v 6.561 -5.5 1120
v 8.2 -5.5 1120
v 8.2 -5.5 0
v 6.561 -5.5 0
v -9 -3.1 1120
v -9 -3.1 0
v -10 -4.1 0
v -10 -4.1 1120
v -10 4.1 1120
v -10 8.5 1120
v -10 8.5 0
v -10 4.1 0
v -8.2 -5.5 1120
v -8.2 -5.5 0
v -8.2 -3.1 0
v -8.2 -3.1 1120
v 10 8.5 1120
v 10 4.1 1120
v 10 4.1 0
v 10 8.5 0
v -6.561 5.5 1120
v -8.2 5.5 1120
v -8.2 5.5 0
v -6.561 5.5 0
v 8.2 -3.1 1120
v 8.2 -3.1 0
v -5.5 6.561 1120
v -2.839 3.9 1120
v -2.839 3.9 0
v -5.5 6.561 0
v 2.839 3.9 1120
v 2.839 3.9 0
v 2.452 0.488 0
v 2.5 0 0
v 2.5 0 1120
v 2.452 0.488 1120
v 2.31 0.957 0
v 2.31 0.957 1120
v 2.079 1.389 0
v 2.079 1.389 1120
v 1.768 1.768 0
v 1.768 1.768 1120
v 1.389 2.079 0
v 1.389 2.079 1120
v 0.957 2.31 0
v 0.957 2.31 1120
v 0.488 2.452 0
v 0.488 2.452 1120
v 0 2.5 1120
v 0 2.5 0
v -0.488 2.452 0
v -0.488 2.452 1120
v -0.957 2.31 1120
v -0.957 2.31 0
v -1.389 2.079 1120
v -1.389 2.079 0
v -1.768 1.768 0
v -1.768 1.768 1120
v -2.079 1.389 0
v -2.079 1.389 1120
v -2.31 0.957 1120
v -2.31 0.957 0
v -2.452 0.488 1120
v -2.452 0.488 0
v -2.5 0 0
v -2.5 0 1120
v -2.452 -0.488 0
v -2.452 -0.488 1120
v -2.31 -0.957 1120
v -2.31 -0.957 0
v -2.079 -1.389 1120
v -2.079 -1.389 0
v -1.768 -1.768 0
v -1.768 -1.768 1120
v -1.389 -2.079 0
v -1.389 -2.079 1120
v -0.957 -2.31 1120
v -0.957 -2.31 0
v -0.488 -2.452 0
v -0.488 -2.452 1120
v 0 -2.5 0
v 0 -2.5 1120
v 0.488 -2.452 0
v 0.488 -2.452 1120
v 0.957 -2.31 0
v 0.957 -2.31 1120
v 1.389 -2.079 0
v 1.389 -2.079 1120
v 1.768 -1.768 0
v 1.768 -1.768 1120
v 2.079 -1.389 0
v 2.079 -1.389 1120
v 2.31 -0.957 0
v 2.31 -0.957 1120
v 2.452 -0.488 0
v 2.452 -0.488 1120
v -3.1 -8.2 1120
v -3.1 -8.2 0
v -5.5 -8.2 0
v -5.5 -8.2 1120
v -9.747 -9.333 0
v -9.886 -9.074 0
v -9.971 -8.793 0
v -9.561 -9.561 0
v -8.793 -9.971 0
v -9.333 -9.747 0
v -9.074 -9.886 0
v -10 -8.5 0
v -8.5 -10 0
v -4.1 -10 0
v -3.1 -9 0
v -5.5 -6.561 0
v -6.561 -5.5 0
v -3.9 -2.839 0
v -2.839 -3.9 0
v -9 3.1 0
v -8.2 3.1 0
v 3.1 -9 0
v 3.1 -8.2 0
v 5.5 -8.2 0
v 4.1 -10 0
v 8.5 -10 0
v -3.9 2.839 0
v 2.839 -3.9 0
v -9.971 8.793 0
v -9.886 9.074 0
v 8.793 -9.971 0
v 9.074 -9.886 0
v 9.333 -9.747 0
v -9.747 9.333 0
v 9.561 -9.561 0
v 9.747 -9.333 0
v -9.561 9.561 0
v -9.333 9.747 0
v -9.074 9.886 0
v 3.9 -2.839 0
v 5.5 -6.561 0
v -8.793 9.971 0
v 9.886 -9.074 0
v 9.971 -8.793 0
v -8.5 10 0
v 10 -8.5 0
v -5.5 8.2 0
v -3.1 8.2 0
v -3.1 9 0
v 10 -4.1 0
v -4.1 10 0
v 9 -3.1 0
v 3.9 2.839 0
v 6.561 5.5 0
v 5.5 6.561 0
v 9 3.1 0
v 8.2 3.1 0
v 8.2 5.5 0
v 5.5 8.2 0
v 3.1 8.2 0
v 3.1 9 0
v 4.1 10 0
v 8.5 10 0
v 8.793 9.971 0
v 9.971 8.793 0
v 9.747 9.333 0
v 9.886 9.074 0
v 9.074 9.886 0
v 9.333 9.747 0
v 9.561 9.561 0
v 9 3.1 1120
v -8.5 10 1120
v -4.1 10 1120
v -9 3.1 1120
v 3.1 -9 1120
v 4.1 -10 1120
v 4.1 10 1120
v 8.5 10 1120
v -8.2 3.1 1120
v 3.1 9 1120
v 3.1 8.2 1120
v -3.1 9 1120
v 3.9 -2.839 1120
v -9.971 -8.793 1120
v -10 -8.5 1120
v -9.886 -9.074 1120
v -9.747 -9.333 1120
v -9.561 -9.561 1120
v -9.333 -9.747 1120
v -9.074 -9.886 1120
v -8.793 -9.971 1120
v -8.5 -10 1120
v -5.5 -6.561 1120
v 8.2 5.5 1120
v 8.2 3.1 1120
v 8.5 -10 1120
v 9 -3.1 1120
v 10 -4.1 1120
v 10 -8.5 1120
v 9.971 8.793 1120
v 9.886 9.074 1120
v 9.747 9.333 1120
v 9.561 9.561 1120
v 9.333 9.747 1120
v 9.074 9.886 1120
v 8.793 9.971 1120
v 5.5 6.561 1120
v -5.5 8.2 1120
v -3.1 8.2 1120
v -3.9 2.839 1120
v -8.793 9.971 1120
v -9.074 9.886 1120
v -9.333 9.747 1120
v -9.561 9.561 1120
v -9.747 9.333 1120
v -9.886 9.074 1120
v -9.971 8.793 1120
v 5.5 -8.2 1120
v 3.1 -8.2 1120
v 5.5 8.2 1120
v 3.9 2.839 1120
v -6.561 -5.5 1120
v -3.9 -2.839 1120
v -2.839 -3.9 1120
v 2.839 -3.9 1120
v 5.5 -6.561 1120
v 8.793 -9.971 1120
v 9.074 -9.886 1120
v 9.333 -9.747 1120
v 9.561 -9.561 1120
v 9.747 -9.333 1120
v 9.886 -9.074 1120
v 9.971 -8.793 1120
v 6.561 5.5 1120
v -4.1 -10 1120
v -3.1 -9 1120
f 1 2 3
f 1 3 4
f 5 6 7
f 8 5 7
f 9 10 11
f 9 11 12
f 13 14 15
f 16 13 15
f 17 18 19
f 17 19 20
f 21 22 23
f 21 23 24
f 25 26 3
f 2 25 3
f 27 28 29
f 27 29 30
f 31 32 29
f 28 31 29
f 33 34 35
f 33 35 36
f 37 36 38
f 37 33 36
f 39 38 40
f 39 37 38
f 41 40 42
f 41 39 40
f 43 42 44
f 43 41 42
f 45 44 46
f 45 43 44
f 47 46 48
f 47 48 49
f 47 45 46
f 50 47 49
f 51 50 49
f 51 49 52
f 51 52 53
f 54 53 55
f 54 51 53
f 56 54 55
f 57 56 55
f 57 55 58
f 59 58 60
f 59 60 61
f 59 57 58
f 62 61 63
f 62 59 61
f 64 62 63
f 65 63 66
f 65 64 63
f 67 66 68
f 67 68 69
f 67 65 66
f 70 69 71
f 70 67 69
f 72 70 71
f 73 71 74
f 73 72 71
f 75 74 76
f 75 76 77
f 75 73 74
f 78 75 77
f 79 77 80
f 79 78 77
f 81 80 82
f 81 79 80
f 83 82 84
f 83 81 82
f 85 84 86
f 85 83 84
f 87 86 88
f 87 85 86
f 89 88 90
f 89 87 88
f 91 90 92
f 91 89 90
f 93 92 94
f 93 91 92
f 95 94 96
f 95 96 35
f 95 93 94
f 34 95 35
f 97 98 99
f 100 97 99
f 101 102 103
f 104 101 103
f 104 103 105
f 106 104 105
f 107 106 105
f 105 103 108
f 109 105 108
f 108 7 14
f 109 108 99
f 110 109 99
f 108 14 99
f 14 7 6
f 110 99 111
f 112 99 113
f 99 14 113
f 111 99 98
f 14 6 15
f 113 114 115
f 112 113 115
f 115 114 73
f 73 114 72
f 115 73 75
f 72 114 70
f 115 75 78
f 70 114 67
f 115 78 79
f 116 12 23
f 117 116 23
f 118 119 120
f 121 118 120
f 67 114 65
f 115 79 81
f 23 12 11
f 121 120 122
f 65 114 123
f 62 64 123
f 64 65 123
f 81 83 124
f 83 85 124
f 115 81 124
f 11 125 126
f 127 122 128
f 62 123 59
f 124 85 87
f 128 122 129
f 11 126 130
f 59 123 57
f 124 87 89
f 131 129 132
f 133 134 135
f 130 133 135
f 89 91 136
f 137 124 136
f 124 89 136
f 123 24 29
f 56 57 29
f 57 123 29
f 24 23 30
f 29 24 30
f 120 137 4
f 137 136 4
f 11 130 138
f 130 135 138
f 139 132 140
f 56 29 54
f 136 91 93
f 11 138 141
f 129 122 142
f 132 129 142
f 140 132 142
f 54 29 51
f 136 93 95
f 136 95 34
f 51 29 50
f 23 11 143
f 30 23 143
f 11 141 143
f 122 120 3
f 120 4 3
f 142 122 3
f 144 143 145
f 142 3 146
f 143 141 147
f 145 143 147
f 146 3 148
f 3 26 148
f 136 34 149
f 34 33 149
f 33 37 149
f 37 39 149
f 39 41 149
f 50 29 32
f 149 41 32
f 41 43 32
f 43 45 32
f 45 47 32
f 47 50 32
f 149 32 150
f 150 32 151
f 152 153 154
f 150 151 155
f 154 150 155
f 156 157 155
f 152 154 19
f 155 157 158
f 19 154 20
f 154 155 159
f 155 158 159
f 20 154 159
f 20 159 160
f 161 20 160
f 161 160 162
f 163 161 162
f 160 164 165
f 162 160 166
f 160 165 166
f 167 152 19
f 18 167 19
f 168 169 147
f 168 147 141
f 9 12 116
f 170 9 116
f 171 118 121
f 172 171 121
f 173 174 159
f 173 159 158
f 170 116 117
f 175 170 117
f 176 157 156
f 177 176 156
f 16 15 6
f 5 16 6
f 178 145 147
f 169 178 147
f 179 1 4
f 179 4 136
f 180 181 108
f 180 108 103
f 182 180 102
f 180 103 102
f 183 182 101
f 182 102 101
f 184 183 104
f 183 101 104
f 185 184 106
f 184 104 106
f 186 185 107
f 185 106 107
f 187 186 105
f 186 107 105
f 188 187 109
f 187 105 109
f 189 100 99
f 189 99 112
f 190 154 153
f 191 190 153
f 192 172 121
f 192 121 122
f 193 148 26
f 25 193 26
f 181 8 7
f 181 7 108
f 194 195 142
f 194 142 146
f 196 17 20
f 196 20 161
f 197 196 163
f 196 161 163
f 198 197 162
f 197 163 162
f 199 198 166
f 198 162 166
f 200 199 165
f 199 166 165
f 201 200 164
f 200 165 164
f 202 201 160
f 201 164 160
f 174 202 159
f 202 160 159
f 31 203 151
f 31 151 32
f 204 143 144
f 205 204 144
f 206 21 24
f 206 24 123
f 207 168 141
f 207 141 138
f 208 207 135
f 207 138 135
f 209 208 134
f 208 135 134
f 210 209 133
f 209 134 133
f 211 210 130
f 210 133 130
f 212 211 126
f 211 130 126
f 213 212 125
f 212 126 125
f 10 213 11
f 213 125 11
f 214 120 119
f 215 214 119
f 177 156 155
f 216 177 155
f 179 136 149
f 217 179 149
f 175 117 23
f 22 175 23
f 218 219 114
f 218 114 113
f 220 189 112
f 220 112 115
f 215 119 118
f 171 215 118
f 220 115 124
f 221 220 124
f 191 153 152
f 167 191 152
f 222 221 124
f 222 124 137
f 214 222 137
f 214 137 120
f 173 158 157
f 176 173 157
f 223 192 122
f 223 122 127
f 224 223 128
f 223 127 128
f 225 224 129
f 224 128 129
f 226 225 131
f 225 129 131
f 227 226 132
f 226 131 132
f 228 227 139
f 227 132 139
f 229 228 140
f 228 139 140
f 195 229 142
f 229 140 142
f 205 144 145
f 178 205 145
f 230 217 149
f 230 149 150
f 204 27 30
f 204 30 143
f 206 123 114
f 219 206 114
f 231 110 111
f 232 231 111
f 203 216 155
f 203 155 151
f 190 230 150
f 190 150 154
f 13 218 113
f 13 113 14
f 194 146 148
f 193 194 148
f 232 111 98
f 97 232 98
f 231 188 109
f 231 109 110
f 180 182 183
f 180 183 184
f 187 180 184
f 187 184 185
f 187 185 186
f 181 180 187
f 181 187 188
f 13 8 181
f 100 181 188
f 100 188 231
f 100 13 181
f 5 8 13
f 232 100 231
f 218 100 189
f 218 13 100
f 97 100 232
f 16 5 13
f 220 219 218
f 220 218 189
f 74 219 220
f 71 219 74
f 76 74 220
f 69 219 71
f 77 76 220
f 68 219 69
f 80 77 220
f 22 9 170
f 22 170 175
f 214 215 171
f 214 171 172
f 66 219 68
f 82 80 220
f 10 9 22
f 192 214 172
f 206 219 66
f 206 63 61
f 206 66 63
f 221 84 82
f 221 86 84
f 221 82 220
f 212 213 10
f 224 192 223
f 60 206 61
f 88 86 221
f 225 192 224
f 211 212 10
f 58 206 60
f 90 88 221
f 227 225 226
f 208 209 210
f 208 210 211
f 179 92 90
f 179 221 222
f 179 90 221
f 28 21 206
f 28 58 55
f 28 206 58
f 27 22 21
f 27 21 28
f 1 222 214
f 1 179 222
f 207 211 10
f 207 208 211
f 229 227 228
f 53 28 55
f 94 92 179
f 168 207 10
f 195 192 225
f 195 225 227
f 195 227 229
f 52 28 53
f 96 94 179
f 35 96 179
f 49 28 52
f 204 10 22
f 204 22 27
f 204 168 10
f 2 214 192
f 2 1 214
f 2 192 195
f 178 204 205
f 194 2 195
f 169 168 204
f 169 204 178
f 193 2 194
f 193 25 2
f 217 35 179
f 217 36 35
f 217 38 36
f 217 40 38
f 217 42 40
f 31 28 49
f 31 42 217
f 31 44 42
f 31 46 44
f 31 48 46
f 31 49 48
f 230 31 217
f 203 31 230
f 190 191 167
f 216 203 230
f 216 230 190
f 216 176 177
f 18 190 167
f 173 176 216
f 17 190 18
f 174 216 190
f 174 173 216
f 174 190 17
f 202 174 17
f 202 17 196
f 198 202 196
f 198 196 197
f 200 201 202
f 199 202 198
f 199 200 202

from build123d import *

# Parameters (mm, degrees)
SKETCH1_R           = 2.5
BOSS_EXTRUDE1_DEPTH = 1120


with BuildPart() as part:
    # Sketch1 → Boss-Extrude1 (new body)
    with BuildSketch(Plane.XY):
        with BuildLine():
            Line((2.839339828, 3.9), (-2.839339828, 3.9))
            Line((-2.839339828, 3.9), (-5.5, 6.560660172))
            Line((-5.5, 6.560660172), (-5.5, 8.2))
            Line((-5.5, 8.2), (-3.1, 8.2))
            Line((-3.1, 8.2), (-3.1, 9))
            Line((-3.1, 9), (-4.1, 10))
            Line((-4.1, 10), (-8.5, 10))
            ThreePointArc((-8.5, 10), (-9.560660172, 9.560660172), (-10, 8.5))
            Line((-10, 8.5), (-10, 4.1))
            Line((-10, 4.1), (-9, 3.1))
            Line((-9, 3.1), (-8.2, 3.1))
            Line((-8.2, 3.1), (-8.2, 5.5))
            Line((-8.2, 5.5), (-6.560660172, 5.5))
            Line((-6.560660172, 5.5), (-3.9, 2.839339828))
            Line((-3.9, 2.839339828), (-3.9, -2.839339828))
            Line((-3.9, -2.839339828), (-6.560660172, -5.5))
            Line((-6.560660172, -5.5), (-8.2, -5.5))
            Line((-8.2, -5.5), (-8.2, -3.1))
            Line((-8.2, -3.1), (-9, -3.1))
            Line((-9, -3.1), (-10, -4.1))
            Line((-10, -4.1), (-10, -8.5))
            ThreePointArc((-10, -8.5), (-9.560660172, -9.560660172), (-8.5, -10))
            Line((-8.5, -10), (-4.1, -10))
            Line((-4.1, -10), (-3.1, -9))
            Line((-3.1, -9), (-3.1, -8.2))
            Line((-3.1, -8.2), (-5.5, -8.2))
            Line((-5.5, -8.2), (-5.5, -6.560660172))
            Line((-5.5, -6.560660172), (-2.839339828, -3.9))
            Line((-2.839339828, -3.9), (2.839339828, -3.9))
            Line((2.839339828, -3.9), (5.5, -6.560660172))
            Line((5.5, -6.560660172), (5.5, -8.2))
            Line((5.5, -8.2), (3.1, -8.2))
            Line((3.1, -8.2), (3.1, -9))
            Line((3.1, -9), (4.1, -10))
            Line((4.1, -10), (8.5, -10))
            ThreePointArc((8.5, -10), (9.560660172, -9.560660172), (10, -8.5))
            Line((10, -8.5), (10, -4.1))
            Line((10, -4.1), (9, -3.1))
            Line((9, -3.1), (8.2, -3.1))
            Line((8.2, -3.1), (8.2, -5.5))
            Line((8.2, -5.5), (6.560660172, -5.5))
            Line((6.560660172, -5.5), (3.9, -2.839339828))
            Line((3.9, -2.839339828), (3.9, 2.839339828))
            Line((3.9, 2.839339828), (6.560660172, 5.5))
            Line((6.560660172, 5.5), (8.2, 5.5))
            Line((8.2, 5.5), (8.2, 3.1))
            Line((8.2, 3.1), (9, 3.1))
            Line((9, 3.1), (10, 4.1))
            Line((10, 4.1), (10, 8.5))
            ThreePointArc((10, 8.5), (9.560660172, 9.560660172), (8.5, 10))
            Line((8.5, 10), (4.1, 10))
            Line((4.1, 10), (3.1, 9))
            Line((3.1, 9), (3.1, 8.2))
            Line((3.1, 8.2), (5.5, 8.2))
            Line((5.5, 8.2), (5.5, 6.560660172))
            Line((5.5, 6.560660172), (2.839339828, 3.9))
        make_face()
        Circle(SKETCH1_R, mode=Mode.SUBTRACT)
    extrude(amount=BOSS_EXTRUDE1_DEPTH)


solid = part.part
